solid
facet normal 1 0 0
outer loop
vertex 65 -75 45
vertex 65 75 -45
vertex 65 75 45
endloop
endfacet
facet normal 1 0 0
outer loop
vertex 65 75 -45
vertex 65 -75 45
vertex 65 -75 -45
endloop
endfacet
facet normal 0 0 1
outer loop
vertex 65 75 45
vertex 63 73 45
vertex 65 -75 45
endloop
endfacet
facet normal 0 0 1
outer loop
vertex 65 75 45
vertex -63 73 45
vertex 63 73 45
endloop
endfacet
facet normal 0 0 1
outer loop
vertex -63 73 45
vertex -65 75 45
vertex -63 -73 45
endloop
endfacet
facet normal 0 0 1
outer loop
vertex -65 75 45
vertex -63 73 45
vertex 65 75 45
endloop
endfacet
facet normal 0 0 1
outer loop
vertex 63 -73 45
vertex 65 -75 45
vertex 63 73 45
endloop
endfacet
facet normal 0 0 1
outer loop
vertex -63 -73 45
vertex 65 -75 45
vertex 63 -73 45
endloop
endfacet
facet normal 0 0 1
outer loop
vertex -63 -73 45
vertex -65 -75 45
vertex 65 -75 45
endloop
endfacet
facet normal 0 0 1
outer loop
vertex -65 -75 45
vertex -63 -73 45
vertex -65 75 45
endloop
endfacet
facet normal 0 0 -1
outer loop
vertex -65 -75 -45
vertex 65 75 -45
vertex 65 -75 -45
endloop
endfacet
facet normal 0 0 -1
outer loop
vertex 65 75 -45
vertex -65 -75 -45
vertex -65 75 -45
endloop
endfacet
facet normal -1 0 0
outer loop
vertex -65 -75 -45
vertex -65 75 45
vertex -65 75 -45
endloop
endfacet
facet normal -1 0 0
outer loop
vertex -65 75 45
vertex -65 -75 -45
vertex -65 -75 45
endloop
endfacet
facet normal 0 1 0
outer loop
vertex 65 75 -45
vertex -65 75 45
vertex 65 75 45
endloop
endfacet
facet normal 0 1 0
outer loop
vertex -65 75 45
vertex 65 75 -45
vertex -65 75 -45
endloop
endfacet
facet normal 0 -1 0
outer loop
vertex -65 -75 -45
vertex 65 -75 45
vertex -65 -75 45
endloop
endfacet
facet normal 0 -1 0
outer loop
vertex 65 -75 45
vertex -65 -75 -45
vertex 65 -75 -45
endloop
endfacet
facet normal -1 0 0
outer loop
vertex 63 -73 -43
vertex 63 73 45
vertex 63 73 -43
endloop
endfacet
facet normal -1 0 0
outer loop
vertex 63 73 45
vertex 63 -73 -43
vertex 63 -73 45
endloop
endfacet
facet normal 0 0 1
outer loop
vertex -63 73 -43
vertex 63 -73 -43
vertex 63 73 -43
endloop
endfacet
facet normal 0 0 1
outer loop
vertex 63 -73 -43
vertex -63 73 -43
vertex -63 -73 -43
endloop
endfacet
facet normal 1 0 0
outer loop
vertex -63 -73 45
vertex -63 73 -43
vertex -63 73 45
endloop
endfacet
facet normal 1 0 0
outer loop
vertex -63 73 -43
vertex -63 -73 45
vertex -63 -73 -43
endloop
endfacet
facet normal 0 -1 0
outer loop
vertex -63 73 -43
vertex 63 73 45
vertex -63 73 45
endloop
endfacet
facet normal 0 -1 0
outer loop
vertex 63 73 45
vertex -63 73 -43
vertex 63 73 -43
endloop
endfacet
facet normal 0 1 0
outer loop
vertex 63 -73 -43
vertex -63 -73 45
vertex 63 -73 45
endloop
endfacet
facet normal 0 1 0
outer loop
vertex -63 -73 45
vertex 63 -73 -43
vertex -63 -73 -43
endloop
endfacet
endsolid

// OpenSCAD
// ========================================
// a 130 x 150 x 90 mm enclosure with 2 mm wall thickness
// NeuroCAD canonical IR; dimensions are millimetres
// ========================================
$fn = 48;

difference() {
  cube(size=[130, 150, 90], center=true);
  translate([0, 0, 1.1]) {
    cube(size=[126, 146, 88.2], center=true);
  }
}
